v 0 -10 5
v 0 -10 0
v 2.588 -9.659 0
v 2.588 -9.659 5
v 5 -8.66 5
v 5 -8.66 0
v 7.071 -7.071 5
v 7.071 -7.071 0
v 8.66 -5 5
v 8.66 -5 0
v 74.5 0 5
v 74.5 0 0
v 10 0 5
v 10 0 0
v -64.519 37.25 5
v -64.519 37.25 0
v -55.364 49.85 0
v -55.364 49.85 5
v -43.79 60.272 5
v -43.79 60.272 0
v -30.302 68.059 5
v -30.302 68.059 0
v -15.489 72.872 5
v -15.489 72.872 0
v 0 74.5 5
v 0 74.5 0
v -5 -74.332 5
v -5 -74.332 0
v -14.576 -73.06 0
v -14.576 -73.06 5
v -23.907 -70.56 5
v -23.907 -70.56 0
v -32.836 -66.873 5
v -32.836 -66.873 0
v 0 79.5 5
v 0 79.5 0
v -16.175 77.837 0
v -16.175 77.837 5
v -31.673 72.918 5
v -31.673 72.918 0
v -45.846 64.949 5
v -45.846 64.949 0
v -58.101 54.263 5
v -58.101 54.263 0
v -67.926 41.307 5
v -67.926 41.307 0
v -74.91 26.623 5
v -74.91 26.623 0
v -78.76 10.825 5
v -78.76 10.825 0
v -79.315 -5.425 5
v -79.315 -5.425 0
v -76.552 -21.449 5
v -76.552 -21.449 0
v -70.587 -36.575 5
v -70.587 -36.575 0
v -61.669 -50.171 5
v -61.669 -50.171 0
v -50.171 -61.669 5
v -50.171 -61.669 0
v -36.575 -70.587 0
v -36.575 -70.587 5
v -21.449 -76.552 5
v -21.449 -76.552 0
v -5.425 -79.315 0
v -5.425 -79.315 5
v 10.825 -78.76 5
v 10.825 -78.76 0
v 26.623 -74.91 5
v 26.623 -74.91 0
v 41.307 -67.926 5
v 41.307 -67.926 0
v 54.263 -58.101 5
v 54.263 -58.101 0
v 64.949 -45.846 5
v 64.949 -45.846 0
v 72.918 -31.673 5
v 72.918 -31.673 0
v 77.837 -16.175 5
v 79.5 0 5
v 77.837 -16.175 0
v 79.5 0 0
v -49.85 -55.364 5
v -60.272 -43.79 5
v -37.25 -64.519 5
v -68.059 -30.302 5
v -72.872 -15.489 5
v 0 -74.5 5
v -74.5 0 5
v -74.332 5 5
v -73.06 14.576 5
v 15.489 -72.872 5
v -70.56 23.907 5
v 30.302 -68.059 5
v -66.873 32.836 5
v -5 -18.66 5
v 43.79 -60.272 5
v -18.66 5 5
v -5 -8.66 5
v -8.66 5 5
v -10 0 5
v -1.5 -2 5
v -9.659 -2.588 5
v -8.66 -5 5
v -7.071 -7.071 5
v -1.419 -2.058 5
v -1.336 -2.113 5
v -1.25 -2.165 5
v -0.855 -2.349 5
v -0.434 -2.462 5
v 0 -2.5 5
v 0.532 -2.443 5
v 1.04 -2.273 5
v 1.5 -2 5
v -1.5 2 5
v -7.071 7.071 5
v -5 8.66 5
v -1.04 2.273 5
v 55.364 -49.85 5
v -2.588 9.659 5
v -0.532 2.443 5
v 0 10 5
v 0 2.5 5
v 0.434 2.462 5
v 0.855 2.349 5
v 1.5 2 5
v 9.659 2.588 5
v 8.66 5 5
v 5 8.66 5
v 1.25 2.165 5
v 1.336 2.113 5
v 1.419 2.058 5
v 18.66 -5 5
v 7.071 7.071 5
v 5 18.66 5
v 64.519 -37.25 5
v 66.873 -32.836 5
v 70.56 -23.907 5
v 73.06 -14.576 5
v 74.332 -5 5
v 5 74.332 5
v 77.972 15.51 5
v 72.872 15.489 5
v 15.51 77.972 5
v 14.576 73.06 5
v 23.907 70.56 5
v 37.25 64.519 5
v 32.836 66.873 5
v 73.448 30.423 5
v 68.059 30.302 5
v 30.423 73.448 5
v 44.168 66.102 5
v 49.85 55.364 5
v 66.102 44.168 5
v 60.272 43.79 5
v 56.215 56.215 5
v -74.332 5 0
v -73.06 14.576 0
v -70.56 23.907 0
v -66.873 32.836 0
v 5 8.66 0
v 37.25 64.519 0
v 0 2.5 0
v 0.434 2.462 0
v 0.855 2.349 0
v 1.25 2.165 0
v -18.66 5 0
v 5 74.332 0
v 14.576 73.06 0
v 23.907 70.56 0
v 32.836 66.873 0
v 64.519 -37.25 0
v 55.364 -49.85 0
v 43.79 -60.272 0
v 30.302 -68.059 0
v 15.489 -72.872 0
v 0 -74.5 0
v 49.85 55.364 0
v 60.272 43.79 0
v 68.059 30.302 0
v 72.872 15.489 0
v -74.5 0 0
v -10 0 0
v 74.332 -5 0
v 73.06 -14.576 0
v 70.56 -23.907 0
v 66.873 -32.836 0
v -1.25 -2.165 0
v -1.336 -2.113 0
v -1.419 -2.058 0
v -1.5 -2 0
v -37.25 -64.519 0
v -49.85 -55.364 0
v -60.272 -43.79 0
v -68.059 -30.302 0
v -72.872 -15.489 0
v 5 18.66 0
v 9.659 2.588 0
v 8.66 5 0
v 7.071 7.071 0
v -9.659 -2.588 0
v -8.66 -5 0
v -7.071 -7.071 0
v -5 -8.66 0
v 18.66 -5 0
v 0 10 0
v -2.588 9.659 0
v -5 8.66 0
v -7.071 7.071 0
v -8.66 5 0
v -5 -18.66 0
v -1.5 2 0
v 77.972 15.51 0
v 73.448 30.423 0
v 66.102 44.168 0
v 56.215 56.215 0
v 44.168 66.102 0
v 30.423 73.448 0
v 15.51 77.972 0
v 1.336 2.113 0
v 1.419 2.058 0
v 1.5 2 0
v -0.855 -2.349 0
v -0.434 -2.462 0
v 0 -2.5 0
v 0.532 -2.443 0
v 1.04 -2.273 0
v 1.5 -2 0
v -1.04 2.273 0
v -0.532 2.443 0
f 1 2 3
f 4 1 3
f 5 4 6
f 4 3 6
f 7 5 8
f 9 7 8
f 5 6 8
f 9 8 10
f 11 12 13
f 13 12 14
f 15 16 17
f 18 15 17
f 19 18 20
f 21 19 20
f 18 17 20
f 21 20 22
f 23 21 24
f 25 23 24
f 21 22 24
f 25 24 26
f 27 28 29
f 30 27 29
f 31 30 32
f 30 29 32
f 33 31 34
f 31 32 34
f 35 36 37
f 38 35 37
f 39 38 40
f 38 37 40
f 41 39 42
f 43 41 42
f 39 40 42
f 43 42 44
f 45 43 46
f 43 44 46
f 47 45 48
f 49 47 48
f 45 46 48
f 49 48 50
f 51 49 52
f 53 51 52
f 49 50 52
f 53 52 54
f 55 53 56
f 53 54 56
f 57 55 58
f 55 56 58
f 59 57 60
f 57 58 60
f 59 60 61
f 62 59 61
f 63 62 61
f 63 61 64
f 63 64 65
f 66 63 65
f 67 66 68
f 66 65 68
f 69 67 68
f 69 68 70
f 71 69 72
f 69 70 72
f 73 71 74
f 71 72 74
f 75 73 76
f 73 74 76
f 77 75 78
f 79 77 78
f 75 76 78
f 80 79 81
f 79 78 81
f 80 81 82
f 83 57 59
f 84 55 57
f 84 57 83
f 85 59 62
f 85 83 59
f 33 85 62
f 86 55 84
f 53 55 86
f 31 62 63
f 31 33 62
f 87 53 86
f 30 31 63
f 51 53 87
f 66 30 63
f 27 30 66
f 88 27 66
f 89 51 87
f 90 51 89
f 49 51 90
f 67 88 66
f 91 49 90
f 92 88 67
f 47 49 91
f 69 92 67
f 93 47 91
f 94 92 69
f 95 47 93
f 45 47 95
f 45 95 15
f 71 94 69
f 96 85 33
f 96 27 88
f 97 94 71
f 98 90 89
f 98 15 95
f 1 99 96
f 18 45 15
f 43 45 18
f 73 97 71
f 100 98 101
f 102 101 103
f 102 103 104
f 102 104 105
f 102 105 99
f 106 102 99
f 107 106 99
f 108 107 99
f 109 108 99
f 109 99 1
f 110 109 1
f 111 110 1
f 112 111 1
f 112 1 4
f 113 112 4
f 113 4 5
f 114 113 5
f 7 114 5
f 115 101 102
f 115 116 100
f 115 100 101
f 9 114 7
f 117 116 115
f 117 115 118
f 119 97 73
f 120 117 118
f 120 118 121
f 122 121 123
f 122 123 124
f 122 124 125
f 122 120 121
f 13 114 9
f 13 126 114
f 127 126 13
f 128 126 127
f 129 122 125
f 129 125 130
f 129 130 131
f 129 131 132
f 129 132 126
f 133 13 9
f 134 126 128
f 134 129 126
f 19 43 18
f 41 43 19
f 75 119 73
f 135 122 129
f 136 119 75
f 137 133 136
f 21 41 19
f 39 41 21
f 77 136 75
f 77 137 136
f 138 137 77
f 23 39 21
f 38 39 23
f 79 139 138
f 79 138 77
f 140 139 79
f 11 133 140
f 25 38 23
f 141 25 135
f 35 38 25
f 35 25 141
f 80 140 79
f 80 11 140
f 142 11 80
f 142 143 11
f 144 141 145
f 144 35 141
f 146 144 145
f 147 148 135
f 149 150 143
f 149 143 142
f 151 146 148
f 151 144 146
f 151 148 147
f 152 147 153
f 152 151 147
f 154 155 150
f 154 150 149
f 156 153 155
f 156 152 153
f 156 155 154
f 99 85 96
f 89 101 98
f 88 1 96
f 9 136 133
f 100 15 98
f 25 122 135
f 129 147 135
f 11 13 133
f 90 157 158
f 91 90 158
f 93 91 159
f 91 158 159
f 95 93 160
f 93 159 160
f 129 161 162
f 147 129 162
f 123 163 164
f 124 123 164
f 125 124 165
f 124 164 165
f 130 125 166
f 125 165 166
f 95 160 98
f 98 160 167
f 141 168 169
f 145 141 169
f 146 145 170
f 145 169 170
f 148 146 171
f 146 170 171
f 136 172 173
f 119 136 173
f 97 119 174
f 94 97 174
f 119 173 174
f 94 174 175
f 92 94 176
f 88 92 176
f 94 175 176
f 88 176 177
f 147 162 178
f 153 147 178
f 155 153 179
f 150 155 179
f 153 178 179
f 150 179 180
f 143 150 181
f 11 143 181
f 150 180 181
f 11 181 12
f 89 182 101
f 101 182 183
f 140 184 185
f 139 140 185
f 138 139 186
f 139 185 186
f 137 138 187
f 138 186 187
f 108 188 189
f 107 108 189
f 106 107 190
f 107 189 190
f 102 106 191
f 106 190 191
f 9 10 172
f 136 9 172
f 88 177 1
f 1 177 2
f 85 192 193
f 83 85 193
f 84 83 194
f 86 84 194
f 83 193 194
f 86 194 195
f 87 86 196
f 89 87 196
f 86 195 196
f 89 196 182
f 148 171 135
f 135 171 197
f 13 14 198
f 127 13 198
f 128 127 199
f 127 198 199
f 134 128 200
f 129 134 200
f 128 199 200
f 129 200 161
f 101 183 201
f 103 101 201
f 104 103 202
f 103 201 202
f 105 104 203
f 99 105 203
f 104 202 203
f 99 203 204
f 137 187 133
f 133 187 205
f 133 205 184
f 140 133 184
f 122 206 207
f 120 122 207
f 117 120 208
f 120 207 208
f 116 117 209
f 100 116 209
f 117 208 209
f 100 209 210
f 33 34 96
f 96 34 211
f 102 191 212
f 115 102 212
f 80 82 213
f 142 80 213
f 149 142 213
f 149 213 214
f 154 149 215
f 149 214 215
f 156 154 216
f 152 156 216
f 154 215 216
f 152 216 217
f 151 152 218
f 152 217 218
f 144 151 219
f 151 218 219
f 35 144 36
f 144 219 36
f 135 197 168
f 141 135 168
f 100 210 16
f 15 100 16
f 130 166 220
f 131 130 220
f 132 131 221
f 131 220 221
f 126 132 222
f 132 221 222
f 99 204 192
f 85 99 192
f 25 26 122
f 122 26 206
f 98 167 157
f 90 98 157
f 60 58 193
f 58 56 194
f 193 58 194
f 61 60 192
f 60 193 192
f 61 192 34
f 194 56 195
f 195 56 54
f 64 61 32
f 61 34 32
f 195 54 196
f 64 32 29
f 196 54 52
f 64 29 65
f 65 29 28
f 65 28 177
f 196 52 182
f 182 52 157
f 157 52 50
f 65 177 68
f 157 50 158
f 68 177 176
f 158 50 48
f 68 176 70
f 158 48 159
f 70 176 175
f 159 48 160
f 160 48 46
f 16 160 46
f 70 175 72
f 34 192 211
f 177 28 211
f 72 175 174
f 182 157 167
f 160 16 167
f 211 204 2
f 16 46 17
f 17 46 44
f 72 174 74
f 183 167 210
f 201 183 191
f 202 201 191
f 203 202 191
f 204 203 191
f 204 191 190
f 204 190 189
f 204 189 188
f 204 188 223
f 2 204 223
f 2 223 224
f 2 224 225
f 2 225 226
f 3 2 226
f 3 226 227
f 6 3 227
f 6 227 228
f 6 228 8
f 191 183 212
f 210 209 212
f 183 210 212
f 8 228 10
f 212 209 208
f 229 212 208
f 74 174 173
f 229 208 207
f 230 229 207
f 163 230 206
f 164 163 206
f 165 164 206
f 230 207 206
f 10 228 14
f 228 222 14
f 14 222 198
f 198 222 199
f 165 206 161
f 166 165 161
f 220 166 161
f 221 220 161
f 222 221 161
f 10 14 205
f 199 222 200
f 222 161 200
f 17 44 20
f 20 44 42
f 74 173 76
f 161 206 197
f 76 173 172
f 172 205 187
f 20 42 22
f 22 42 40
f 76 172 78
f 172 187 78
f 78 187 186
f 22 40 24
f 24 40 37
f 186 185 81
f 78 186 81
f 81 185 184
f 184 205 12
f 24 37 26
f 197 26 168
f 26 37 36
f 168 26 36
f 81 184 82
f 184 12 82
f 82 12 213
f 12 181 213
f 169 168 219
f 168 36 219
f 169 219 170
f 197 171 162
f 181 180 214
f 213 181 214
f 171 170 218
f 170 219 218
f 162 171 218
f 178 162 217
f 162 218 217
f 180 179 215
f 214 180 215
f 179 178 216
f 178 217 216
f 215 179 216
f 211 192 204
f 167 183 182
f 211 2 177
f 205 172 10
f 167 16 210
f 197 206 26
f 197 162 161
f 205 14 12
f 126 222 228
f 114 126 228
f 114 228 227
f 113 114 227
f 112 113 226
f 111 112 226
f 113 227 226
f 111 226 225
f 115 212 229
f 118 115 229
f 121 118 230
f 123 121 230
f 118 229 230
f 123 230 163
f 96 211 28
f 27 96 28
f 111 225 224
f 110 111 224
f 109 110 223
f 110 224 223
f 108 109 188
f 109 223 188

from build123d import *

# Parameters (mm, degrees)
F1_DEPTH = 5


with BuildPart() as f1:
    # F0 (on Top) → F1 (new body)
    with BuildSketch(Plane.XY):
        with BuildLine():
            ThreePointArc((0, 79.5), (-56.2149891043, -56.2149891043), (79.5, 0))
            ThreePointArc((79.5, 0), (56.2149891043, 56.2149891043), (0, 79.5))
        make_face()
        with BuildLine():
            ThreePointArc((-64.5188925819, 37.25), (-37.25, 64.5188925819), (0, 74.5))
            ThreePointArc((0, 74.5), (2.5014103755, 74.4579945079), (5, 74.3320253996))
            ThreePointArc((5, 74.3320253996), (19.2820188601, 71.9614740585), (32.8358856809, 66.8734223108))
            ThreePointArc((32.8358856809, 66.8734223108), (35.0627123235, 65.7332199464), (37.25, 64.5188925819))
            ThreePointArc((37.25, 64.5188925819), (64.5188925819, 37.25), (74.5, 0))
            ThreePointArc((74.5, 0), (74.4579945079, -2.5014103755), (74.3320253996, -5))
            ThreePointArc((74.3320253996, -5), (71.9614740585, -19.2820188601), (66.8734223108, -32.8358856809))
            ThreePointArc((66.8734223108, -32.8358856809), (65.7332199464, -35.0627123235), (64.5188925819, -37.25))
            ThreePointArc((64.5188925819, -37.25), (37.25, -64.5188925819), (0, -74.5))
            ThreePointArc((0, -74.5), (-2.5014103755, -74.4579945079), (-5, -74.3320253996))
            ThreePointArc((-5, -74.3320253996), (-19.2820188601, -71.9614740585), (-32.8358856809, -66.8734223108))
            ThreePointArc((-32.8358856809, -66.8734223108), (-35.0627123235, -65.7332199464), (-37.25, -64.5188925819))
            ThreePointArc((-37.25, -64.5188925819), (-64.5188925819, -37.25), (-74.5, 0))
            ThreePointArc((-74.5, 0), (-74.4579945079, 2.5014103755), (-74.3320253996, 5))
            ThreePointArc((-74.3320253996, 5), (-71.9614740585, 19.2820188601), (-66.8734223108, 32.8358856809))
            ThreePointArc((-66.8734223108, 32.8358856809), (-65.7332199464, 35.0627123235), (-64.5188925819, 37.25))
        make_face(mode=Mode.SUBTRACT)
        with BuildLine():
            Line((-8.6602540378, 5), (-64.5188925819, 37.25))
            ThreePointArc((-64.5188925819, 37.25), (-65.7332199464, 35.0627123235), (-66.8734223108, 32.8358856809))
            Line((-66.8734223108, 32.8358856809), (-18.6602540378, 5))
            Line((-18.6602540378, 5), (-74.3320253996, 5))
            ThreePointArc((-74.3320253996, 5), (-74.4579945079, 2.5014103755), (-74.5, 0))
            Line((-74.5, 0), (-10, 0))
            ThreePointArc((-10, 0), (-9.6592582629, 2.588190451), (-8.6602540378, 5))
        make_face()
        with BuildLine():
            Line((74.5, 0), (10, 0))
            ThreePointArc((10, 0), (9.6592582629, -2.588190451), (8.6602540378, -5))
            Line((8.6602540378, -5), (64.5188925819, -37.25))
            ThreePointArc((64.5188925819, -37.25), (65.7332199464, -35.0627123235), (66.8734223108, -32.8358856809))
            Line((66.8734223108, -32.8358856809), (18.6602540378, -5))
            Line((18.6602540378, -5), (74.3320253996, -5))
            ThreePointArc((74.3320253996, -5), (74.4579945079, -2.5014103755), (74.5, 0))
        make_face()
        with BuildLine():
            ThreePointArc((0, -10), (-2.588190451, -9.6592582629), (-5, -8.6602540378))
            Line((-5, -8.6602540378), (-37.25, -64.5188925819))
            ThreePointArc((-37.25, -64.5188925819), (-35.0627123235, -65.7332199464), (-32.8358856809, -66.8734223108))
            Line((-32.8358856809, -66.8734223108), (-5, -18.6602540378))
            Line((-5, -18.6602540378), (-5, -74.3320253996))
            ThreePointArc((-5, -74.3320253996), (-2.5014103755, -74.4579945079), (0, -74.5))
            Line((0, -74.5), (0, -10))
        make_face()
        with BuildLine():
            ThreePointArc((5, 74.3320253996), (2.5014103755, 74.4579945079), (0, 74.5))
            Line((0, 74.5), (0, 10))
            ThreePointArc((0, 10), (2.588190451, 9.6592582629), (5, 8.6602540378))
            Line((5, 8.6602540378), (37.25, 64.5188925819))
            ThreePointArc((37.25, 64.5188925819), (35.0627123235, 65.7332199464), (32.8358856809, 66.8734223108))
            Line((32.8358856809, 66.8734223108), (5, 18.6602540378))
            Line((5, 18.6602540378), (5, 74.3320253996))
        make_face()
        with BuildLine():
            ThreePointArc((8.6602540378, -5), (9.6592582629, -2.588190451), (10, 0))
            Line((10, 0), (2.5, 0))
            ThreePointArc((2.5, 0), (2.4148145657, -0.6470476128), (2.1650635095, -1.25))
            Line((2.1650635095, -1.25), (8.6602540378, -5))
        make_face()
        with BuildLine():
            ThreePointArc((0, -10), (5, -8.6602540378), (8.6602540378, -5))
            Line((8.6602540378, -5), (2.1650635095, -1.25))
            ThreePointArc((2.1650635095, -1.25), (1.8705073194, -1.6586748831), (1.5, -2))
            ThreePointArc((1.5, -2), (0.790569415, -2.3717082451), (0, -2.5))
            Line((0, -2.5), (0, -10))
        make_face()
        with BuildLine():
            ThreePointArc((10, 0), (8.6602540378, 5), (5, 8.6602540378))
            Line((5, 8.6602540378), (1.25, 2.1650635095))
            ThreePointArc((1.25, 2.1650635095), (1.3774746787, 2.0862798253), (1.5, 2))
            ThreePointArc((1.5, 2), (2.2360679775, 1.1180339887), (2.5, 0))
            Line((2.5, 0), (10, 0))
        make_face()
        with BuildLine():
            ThreePointArc((5, 8.6602540378), (2.588190451, 9.6592582629), (0, 10))
            Line((0, 10), (0, 2.5))
            ThreePointArc((0, 2.5), (0.6470476128, 2.4148145657), (1.25, 2.1650635095))
            Line((1.25, 2.1650635095), (5, 8.6602540378))
        make_face()
        with BuildLine():
            Line((0, 2.5), (0, 10))
            ThreePointArc((0, 10), (-5, 8.6602540378), (-8.6602540378, 5))
            Line((-8.6602540378, 5), (-2.1650635095, 1.25))
            ThreePointArc((-2.1650635095, 1.25), (-1.8705073194, 1.6586748831), (-1.5, 2))
            ThreePointArc((-1.5, 2), (-0.790569415, 2.3717082451), (0, 2.5))
        make_face()
        with BuildLine():
            Line((-2.1650635095, 1.25), (-8.6602540378, 5))
            ThreePointArc((-8.6602540378, 5), (-9.6592582629, 2.588190451), (-10, 0))
            Line((-10, 0), (-2.5, 0))
            ThreePointArc((-2.5, 0), (-2.4148145657, 0.6470476128), (-2.1650635095, 1.25))
        make_face()
        with BuildLine():
            Line((-2.5, 0), (-10, 0))
            ThreePointArc((-10, 0), (-8.6602540378, -5), (-5, -8.6602540378))
            Line((-5, -8.6602540378), (-1.25, -2.1650635095))
            ThreePointArc((-1.25, -2.1650635095), (-1.3774746787, -2.0862798253), (-1.5, -2))
            ThreePointArc((-1.5, -2), (-2.2360679775, -1.1180339887), (-2.5, 0))
        make_face()
        with BuildLine():
            Line((-1.25, -2.1650635095), (-5, -8.6602540378))
            ThreePointArc((-5, -8.6602540378), (-2.588190451, -9.6592582629), (0, -10))
            Line((0, -10), (0, -2.5))
            ThreePointArc((0, -2.5), (-0.6470476128, -2.4148145657), (-1.25, -2.1650635095))
        make_face()
        with BuildLine():
            ThreePointArc((2.1650635095, -1.25), (2.4148145657, -0.6470476128), (2.5, 0))
            Line((2.5, 0), (1.5, 0))
            Line((1.5, 0), (1.5, -0.8660254038))
            Line((1.5, -0.8660254038), (2.1650635095, -1.25))
        make_face()
        with BuildLine():
            Line((1.5, 0), (2.5, 0))
            ThreePointArc((2.5, 0), (2.2360679775, 1.1180339887), (1.5, 2))
            Line((1.5, 2), (1.5, 0))
        make_face()
        with BuildLine():
            Line((2.1650635095, -1.25), (1.5, -0.8660254038))
            Line((1.5, -0.8660254038), (1.5, -2))
            ThreePointArc((1.5, -2), (1.8705073194, -1.6586748831), (2.1650635095, -1.25))
        make_face()
        with BuildLine():
            Line((-1.5, 0), (-2.5, 0))
            ThreePointArc((-2.5, 0), (-2.2360679775, -1.1180339887), (-1.5, -2))
            Line((-1.5, -2), (-1.5, 0))
        make_face()
        with BuildLine():
            Line((-1.5, 0.8660254038), (-2.1650635095, 1.25))
            ThreePointArc((-2.1650635095, 1.25), (-2.4148145657, 0.6470476128), (-2.5, 0))
            Line((-2.5, 0), (-1.5, 0))
            Line((-1.5, 0), (-1.5, 0.8660254038))
        make_face()
        with BuildLine():
            ThreePointArc((-1.5, 2), (-1.8705073194, 1.6586748831), (-2.1650635095, 1.25))
            Line((-2.1650635095, 1.25), (-1.5, 0.8660254038))
            Line((-1.5, 0.8660254038), (-1.5, 2))
        make_face()
    extrude(amount=F1_DEPTH)


solid = f1.part
